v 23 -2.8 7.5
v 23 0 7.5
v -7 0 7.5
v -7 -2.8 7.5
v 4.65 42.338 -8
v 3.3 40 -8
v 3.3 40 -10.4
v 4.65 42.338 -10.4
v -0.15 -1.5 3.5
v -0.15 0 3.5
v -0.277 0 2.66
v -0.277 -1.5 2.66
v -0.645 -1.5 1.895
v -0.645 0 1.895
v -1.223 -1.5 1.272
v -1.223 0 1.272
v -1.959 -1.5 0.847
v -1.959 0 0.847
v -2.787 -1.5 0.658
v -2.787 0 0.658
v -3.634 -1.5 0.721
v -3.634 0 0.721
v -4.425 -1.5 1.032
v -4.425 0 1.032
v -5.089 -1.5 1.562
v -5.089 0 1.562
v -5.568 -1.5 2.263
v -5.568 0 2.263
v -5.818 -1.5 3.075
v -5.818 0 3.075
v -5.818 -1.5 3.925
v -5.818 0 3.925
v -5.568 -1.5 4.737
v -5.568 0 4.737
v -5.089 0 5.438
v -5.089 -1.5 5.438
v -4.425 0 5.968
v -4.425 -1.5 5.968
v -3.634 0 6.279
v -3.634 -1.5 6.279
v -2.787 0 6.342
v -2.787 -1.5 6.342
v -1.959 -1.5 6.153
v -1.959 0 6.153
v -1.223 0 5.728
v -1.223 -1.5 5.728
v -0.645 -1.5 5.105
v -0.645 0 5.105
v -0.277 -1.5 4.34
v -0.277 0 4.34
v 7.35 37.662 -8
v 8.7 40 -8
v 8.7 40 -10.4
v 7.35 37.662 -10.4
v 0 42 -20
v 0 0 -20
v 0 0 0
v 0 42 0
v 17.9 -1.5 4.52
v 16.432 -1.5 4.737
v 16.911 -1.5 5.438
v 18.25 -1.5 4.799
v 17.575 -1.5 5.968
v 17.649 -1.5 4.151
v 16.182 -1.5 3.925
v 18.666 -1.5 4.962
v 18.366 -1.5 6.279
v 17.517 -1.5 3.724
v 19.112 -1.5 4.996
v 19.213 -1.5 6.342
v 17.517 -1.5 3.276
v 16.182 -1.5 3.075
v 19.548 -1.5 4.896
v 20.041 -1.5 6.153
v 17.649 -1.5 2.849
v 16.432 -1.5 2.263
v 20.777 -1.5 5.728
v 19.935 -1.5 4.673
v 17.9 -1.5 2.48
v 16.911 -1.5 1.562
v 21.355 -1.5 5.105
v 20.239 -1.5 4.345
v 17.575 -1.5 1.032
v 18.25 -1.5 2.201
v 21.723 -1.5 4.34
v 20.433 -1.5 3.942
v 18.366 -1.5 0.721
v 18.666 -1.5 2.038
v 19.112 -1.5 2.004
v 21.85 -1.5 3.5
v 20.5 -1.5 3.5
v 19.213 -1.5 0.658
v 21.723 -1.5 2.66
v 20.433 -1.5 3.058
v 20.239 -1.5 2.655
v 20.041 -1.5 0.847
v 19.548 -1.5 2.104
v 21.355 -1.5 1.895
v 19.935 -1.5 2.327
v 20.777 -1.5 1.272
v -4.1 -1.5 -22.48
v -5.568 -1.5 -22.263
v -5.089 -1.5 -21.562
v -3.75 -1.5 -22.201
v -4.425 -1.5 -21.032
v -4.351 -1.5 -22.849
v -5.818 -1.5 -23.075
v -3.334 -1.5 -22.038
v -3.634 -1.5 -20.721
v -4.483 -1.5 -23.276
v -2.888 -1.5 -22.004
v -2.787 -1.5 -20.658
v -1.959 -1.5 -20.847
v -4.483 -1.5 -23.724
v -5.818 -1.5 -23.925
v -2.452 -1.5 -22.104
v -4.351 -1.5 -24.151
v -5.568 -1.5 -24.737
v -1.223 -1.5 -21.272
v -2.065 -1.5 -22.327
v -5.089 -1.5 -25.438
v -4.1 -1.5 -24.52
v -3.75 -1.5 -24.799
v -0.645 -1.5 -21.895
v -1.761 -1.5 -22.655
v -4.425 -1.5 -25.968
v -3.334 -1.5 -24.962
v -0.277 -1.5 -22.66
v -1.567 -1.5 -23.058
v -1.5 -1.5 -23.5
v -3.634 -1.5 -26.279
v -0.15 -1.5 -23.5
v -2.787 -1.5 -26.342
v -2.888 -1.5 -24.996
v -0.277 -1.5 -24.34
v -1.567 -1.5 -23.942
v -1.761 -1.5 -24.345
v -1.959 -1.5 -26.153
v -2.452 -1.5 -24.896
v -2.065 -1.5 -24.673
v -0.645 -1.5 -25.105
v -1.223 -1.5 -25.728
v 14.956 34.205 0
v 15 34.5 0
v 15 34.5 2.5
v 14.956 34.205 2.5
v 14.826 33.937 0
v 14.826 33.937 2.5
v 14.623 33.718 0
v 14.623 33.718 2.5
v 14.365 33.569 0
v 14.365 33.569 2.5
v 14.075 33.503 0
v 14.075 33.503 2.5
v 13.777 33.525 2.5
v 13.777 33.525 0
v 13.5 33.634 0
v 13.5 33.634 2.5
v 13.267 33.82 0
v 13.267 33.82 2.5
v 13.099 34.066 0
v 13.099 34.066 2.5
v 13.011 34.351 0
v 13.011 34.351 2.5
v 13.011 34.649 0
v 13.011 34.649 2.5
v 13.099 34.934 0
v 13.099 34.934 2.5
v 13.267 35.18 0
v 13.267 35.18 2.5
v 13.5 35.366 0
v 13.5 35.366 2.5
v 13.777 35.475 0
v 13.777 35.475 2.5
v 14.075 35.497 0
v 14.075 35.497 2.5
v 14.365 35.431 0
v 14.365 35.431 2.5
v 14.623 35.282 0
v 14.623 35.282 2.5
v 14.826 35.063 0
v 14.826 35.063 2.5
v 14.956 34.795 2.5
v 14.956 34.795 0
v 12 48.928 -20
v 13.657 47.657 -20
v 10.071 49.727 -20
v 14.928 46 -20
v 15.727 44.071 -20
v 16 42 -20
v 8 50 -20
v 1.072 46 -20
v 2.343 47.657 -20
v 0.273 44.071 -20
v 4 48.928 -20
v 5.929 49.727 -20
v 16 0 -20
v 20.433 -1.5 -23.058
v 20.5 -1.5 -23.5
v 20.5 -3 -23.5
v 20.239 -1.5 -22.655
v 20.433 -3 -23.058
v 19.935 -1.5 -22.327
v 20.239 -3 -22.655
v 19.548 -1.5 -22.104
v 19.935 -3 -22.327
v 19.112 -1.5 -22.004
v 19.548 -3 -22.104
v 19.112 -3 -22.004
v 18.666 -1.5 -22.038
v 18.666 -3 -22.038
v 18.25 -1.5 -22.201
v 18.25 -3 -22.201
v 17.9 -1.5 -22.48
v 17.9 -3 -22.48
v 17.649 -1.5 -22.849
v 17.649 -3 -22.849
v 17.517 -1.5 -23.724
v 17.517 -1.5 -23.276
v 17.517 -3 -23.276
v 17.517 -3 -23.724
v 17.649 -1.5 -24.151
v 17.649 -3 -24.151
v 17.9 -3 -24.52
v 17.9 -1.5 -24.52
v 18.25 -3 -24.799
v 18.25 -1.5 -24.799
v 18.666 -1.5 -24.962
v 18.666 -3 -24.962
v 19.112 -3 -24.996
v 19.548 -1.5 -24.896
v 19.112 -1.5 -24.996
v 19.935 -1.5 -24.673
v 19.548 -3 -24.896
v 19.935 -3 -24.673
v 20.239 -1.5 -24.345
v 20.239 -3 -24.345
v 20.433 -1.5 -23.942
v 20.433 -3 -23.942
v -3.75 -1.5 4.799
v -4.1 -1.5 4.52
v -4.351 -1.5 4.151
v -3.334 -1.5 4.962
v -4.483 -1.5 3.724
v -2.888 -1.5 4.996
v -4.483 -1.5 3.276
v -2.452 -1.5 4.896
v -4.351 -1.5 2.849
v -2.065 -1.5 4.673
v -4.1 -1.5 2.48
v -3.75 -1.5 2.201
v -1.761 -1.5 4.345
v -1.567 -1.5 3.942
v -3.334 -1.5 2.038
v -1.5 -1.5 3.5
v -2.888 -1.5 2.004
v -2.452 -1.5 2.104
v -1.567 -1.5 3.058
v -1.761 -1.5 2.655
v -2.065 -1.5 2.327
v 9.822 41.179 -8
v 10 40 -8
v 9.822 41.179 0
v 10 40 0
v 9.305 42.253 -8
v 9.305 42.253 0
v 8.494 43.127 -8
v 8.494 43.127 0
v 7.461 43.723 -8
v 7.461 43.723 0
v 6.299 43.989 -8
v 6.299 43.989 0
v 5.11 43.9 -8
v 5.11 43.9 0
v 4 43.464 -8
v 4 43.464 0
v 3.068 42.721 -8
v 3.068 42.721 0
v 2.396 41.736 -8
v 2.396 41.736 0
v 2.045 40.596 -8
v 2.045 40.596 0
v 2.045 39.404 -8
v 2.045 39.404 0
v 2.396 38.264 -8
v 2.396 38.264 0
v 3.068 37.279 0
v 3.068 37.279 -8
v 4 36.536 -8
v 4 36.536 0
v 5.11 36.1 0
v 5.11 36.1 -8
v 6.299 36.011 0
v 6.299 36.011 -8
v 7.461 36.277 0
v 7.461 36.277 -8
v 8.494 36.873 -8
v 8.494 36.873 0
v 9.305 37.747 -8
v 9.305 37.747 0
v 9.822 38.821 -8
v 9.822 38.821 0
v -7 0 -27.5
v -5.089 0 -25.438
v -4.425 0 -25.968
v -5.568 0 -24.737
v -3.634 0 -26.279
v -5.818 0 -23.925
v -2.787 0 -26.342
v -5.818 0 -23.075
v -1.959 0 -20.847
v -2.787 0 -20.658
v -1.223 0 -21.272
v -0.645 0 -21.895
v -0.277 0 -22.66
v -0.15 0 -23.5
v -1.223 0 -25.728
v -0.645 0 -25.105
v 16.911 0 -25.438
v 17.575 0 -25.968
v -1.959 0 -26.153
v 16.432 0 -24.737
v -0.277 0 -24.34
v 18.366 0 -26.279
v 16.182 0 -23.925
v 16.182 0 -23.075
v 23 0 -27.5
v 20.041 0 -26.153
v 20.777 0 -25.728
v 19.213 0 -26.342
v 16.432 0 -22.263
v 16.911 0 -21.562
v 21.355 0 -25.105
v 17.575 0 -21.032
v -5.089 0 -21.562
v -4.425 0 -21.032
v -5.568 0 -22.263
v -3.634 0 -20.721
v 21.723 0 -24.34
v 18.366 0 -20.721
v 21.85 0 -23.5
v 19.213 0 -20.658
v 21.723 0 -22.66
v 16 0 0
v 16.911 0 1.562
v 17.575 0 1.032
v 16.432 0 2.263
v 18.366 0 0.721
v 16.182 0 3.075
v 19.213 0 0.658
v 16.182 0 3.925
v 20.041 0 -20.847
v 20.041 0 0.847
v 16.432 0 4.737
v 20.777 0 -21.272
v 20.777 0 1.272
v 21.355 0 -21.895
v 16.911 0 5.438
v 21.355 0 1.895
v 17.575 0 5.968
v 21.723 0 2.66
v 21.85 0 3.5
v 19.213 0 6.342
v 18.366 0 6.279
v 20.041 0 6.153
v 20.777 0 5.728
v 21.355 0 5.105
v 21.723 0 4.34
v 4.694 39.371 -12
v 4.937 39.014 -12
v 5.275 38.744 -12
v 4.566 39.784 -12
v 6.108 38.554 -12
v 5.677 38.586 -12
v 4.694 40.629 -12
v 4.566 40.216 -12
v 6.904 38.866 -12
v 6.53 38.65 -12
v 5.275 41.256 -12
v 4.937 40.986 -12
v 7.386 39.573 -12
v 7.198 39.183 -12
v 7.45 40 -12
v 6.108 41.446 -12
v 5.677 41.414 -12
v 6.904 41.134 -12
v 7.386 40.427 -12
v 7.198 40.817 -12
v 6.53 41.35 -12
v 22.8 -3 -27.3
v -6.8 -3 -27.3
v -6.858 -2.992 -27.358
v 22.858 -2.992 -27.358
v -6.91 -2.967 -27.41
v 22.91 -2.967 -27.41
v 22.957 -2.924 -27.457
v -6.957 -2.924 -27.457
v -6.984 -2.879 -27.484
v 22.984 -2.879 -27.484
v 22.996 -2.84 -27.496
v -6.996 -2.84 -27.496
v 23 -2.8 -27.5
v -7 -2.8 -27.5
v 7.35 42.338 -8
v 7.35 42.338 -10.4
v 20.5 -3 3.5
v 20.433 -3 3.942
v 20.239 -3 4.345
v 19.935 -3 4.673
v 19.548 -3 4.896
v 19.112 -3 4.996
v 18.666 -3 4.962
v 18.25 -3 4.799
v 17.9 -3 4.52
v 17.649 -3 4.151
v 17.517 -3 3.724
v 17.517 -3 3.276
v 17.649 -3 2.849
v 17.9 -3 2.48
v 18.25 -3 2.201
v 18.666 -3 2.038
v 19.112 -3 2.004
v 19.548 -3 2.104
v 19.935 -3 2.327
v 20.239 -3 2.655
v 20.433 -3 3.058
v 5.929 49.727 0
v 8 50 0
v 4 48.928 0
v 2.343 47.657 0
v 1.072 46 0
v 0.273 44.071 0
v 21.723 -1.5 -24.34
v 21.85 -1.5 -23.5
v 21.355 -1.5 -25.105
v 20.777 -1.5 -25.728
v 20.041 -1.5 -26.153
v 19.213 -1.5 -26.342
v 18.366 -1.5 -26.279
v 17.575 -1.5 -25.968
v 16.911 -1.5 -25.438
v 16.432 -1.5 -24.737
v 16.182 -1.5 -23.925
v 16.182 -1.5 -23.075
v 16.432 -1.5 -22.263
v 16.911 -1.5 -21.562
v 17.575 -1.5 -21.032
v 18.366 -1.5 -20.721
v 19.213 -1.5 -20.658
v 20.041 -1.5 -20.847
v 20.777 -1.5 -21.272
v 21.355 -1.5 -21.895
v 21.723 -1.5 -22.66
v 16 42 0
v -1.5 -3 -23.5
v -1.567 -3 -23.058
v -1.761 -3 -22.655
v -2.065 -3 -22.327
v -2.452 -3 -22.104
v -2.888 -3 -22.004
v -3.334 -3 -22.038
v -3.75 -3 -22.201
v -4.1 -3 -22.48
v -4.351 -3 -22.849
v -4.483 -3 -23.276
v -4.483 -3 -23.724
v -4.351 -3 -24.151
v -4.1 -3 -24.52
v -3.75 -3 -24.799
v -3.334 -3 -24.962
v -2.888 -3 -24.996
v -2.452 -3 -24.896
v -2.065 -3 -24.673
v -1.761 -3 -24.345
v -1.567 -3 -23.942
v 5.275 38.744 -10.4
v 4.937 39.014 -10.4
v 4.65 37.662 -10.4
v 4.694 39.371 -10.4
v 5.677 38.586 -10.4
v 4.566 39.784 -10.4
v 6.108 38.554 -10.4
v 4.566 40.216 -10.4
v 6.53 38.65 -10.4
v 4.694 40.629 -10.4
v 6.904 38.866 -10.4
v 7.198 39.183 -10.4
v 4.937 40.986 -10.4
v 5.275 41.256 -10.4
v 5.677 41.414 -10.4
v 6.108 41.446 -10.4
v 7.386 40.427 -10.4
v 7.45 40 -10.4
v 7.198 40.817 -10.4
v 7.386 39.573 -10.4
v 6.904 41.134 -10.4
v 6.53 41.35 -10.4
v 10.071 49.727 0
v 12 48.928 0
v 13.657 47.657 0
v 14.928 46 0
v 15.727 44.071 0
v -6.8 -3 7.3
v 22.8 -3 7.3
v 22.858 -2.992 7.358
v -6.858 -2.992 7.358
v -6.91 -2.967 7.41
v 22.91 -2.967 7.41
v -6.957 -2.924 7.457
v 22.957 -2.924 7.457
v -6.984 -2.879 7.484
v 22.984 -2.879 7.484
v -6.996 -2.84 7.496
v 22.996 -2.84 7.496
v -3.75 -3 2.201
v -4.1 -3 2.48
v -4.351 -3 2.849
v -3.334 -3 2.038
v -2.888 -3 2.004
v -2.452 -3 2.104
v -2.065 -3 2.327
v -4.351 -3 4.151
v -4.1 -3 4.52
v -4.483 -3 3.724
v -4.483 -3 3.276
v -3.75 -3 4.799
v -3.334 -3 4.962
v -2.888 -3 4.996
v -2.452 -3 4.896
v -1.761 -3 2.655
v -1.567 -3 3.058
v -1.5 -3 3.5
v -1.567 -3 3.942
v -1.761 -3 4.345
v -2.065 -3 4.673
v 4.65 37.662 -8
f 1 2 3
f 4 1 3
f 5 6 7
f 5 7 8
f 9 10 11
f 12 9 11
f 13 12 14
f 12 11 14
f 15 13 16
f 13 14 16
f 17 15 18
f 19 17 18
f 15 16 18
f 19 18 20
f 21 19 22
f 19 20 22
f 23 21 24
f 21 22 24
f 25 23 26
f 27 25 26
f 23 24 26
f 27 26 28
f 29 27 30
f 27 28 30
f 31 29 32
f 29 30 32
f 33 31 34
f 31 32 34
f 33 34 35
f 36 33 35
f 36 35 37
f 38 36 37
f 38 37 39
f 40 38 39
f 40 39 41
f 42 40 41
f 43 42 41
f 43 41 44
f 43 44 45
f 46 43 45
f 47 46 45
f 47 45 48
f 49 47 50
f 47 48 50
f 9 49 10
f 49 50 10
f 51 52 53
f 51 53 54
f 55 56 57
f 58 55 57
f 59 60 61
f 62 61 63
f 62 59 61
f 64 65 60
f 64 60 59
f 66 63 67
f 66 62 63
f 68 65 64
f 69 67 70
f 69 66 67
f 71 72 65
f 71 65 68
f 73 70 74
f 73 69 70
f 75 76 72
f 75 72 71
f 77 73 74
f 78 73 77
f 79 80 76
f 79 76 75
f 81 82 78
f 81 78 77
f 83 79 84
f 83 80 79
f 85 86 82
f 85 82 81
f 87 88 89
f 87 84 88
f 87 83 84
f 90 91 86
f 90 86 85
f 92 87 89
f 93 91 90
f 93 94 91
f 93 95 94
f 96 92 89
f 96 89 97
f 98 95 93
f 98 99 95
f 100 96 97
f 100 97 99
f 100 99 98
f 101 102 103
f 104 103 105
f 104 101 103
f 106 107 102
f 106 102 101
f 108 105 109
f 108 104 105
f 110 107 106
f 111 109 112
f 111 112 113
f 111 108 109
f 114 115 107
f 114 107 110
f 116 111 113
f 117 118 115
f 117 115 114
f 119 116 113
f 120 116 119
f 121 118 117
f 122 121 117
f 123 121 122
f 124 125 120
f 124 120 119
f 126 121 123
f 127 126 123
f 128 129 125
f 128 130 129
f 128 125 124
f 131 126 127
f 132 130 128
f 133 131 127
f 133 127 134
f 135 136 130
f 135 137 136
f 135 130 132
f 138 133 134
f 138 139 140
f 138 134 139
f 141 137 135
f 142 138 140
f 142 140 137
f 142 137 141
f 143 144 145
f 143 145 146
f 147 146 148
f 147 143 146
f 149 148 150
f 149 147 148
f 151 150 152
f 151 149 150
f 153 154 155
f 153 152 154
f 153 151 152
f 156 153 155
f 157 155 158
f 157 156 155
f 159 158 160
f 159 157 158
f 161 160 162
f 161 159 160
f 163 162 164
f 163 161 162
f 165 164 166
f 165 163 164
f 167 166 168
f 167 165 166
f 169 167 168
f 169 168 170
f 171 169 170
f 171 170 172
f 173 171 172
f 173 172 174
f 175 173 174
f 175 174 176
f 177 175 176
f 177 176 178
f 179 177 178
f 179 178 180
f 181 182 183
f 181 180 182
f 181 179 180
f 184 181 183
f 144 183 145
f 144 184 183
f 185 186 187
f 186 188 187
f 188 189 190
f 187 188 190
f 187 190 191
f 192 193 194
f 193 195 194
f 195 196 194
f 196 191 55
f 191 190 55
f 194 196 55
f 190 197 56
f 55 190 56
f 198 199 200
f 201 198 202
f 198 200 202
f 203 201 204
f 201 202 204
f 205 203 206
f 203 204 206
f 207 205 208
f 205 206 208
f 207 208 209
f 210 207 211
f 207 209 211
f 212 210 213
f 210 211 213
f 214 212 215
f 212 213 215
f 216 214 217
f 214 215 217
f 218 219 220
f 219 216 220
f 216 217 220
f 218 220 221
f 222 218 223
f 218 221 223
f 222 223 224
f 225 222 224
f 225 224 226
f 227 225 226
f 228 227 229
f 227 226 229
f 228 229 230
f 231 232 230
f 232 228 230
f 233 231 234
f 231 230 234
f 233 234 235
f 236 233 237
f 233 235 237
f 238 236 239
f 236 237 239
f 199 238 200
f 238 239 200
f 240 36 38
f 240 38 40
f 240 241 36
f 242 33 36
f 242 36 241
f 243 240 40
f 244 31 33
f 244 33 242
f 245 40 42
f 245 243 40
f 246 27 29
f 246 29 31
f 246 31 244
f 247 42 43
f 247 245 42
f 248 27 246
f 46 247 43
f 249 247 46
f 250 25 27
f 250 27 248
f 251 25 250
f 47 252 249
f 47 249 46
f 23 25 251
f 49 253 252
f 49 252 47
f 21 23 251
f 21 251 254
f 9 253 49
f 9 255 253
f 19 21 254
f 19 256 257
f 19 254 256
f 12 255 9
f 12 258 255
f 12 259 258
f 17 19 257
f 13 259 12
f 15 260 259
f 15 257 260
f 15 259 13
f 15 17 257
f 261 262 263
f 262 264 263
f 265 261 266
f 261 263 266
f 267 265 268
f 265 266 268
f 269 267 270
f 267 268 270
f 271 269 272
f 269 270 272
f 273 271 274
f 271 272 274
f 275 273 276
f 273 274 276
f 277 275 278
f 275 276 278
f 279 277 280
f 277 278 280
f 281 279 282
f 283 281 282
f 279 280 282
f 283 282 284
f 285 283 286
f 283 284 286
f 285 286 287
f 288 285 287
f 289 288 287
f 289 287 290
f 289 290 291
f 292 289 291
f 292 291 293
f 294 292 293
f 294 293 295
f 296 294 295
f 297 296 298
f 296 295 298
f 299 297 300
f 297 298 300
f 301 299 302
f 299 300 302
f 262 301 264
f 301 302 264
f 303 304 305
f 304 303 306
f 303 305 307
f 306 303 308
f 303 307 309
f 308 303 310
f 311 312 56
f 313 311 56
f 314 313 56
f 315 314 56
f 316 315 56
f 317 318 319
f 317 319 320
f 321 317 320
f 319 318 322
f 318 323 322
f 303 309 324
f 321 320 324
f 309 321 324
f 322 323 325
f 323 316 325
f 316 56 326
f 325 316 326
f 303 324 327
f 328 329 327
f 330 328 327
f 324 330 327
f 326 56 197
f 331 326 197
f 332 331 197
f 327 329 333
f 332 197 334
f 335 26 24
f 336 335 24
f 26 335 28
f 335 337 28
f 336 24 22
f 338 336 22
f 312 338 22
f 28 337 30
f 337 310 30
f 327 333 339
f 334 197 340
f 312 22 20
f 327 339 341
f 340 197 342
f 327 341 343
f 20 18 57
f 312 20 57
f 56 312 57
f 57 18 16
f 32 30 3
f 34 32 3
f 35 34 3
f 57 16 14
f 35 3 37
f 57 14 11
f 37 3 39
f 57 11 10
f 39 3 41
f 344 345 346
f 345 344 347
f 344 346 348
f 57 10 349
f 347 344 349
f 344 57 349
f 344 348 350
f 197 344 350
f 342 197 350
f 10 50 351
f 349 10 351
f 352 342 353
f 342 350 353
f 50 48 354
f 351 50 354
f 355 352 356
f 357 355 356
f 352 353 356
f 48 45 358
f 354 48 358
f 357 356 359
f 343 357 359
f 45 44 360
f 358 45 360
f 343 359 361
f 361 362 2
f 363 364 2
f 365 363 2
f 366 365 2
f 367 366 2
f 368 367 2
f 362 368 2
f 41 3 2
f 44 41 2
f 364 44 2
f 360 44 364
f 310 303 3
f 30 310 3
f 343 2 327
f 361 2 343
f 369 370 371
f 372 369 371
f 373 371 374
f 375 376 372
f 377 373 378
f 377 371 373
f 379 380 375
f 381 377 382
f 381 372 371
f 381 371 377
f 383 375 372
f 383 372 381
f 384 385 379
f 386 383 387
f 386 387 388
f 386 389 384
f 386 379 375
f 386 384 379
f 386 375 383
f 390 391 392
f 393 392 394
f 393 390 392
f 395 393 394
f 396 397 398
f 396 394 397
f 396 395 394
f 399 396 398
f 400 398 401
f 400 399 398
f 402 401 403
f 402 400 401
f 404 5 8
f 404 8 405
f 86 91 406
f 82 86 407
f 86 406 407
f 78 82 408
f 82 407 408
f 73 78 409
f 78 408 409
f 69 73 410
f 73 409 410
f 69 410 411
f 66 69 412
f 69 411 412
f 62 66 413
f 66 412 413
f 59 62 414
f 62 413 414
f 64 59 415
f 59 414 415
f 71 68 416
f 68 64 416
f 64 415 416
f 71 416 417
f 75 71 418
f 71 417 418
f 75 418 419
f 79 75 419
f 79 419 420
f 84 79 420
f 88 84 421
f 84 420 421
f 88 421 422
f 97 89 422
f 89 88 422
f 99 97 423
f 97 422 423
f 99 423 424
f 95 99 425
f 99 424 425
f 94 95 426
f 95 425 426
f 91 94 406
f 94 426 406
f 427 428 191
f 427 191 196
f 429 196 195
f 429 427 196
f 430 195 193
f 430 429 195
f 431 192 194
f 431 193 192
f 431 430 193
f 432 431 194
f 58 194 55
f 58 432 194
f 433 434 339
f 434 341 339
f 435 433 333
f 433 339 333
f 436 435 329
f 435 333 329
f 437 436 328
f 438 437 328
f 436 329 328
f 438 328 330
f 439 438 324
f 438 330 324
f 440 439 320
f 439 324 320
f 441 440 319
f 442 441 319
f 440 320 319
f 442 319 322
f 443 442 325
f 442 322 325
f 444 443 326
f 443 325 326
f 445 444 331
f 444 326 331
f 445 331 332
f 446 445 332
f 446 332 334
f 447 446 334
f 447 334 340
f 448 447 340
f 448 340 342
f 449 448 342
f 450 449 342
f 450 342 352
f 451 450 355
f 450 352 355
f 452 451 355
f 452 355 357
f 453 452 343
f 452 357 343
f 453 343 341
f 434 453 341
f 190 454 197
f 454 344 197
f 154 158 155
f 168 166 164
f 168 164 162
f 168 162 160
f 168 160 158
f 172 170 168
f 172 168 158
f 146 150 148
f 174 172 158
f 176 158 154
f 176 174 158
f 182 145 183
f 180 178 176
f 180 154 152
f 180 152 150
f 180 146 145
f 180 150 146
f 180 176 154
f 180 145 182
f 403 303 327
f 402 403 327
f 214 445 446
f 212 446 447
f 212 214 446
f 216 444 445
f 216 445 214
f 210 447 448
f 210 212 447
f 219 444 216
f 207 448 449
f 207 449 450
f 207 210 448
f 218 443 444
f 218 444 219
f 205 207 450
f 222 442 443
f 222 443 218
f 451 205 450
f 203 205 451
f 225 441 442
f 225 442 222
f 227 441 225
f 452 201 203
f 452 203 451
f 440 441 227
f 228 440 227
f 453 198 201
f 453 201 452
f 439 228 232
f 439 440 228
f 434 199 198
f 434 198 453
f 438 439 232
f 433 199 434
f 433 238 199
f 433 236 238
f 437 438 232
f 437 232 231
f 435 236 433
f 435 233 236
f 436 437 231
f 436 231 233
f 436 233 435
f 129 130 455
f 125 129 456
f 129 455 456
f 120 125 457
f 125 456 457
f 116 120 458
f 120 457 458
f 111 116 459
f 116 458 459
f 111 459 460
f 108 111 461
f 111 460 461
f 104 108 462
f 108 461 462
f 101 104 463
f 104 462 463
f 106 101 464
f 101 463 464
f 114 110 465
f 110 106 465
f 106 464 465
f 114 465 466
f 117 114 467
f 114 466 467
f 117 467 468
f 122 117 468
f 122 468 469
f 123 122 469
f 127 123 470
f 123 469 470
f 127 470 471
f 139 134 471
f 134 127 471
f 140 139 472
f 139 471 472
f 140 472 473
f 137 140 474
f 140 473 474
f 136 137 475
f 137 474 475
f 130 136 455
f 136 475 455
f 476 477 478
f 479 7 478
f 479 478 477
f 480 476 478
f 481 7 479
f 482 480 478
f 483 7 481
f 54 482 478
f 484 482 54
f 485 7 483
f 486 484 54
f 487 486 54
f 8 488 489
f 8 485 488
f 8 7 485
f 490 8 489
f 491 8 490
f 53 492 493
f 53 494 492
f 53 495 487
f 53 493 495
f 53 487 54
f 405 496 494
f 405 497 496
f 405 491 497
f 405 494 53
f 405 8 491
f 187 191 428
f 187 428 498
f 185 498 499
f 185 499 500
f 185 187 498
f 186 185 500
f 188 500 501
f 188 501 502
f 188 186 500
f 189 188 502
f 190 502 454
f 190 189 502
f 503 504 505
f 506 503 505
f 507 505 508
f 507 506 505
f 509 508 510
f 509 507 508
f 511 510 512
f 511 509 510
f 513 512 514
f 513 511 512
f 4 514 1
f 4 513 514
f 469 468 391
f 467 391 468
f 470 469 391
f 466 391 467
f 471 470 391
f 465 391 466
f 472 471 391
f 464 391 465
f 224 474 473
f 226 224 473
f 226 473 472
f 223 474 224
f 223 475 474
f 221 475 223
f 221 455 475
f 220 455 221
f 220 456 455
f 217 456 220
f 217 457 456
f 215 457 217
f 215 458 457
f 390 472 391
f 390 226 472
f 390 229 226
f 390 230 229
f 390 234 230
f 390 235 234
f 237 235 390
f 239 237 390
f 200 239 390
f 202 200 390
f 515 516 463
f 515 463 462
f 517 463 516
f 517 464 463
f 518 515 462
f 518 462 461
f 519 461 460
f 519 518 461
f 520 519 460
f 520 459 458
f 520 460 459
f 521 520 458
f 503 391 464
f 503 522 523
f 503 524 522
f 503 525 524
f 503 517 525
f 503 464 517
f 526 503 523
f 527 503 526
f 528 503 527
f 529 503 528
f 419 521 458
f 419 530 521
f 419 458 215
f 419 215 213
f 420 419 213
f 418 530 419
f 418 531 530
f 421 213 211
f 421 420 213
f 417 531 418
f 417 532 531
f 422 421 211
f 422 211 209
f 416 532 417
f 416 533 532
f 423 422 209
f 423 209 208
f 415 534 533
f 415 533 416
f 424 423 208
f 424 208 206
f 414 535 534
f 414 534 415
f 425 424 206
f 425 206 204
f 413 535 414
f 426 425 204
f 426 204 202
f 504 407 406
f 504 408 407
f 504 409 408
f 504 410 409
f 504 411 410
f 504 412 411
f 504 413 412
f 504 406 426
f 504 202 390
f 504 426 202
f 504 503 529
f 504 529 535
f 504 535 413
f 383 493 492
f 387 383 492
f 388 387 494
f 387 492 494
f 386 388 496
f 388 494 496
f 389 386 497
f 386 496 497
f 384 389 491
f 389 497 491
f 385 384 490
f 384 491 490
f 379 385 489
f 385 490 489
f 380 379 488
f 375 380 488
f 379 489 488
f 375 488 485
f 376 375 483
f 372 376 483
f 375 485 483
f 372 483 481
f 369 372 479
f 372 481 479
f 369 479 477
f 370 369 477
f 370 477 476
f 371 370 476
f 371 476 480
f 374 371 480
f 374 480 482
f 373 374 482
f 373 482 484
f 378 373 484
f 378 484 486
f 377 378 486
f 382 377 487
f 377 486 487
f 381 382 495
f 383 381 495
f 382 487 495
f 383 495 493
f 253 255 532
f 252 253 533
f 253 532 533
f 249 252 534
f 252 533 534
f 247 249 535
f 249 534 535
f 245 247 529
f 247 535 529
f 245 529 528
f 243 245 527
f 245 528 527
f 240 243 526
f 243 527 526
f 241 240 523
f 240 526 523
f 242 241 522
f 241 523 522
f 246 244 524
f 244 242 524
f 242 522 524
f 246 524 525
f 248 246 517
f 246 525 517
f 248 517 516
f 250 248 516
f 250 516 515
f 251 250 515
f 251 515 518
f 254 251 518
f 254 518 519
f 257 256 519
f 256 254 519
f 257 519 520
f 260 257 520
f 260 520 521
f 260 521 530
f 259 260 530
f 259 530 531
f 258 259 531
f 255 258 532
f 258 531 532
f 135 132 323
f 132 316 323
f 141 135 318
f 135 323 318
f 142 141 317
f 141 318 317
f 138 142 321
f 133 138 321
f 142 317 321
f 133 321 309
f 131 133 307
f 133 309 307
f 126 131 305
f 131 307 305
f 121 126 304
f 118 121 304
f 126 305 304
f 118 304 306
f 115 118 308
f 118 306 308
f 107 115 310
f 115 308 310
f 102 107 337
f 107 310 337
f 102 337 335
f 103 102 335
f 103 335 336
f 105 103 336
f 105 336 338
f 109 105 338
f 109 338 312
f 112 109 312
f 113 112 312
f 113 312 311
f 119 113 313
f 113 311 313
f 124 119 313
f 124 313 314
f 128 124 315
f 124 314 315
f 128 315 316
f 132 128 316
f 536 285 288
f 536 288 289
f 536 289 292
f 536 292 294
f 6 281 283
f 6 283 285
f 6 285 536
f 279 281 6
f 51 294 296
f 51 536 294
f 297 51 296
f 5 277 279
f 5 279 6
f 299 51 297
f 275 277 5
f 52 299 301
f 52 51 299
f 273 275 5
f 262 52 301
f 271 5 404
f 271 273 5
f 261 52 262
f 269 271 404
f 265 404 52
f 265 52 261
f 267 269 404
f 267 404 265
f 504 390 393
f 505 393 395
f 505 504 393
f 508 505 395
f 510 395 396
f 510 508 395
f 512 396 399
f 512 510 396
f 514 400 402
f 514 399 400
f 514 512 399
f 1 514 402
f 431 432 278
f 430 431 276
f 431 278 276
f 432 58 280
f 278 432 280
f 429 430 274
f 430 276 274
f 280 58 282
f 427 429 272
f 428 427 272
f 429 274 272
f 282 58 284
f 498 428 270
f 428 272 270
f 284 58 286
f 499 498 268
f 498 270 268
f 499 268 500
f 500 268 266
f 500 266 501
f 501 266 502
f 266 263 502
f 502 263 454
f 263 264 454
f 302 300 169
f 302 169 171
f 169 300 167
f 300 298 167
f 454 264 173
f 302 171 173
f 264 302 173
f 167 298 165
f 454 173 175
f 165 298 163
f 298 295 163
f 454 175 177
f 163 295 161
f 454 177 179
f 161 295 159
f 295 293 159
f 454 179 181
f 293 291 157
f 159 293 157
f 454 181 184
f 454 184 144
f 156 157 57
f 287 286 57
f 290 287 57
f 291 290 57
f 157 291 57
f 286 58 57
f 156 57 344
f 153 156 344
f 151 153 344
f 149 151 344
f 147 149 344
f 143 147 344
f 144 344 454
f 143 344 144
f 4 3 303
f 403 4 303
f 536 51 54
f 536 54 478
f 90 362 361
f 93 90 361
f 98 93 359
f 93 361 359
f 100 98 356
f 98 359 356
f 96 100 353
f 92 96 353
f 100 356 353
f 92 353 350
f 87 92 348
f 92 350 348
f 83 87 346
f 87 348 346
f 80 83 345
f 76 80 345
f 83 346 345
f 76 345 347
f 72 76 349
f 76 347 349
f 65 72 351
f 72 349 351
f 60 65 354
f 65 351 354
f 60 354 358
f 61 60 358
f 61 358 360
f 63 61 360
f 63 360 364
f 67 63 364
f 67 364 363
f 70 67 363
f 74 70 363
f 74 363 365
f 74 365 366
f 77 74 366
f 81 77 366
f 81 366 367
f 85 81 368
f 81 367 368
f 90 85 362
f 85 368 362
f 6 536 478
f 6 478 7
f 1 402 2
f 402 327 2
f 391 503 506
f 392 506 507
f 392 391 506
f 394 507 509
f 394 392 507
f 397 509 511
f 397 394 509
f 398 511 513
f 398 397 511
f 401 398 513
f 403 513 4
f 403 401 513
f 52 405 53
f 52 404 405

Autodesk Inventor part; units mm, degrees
ref_plane "YZ Plane" through (0, 0, 0) normal (1, 0, 0) x (0, 1, 0)
ref_plane "XZ Plane" through (0, 0, 0) normal (0, 1, 0) x (-1, 0, 0)
ref_plane "XY Plane" through (0, 0, 0) normal (0, 0, 1) x (1, 0, 0)
sketch "底面" plane through (0, 0, 0) normal (0, 1, 0) x (-1, 0, 0)
  line L0 (0, 0) -> (-16, 0)
  line L1 (-16, 0) -> (-16, -20)
  line L2 (-16, -20) -> (0, -20)
  line L3 (0, -20) -> (0, 0)
  dimension "d0" = 16
  dimension "d1" = 20
extrude "本体" add sketch "底面" along normal blind 50
sketch "ねじ穴スケッチ" plane through (0, 0, 0) normal (0, 0, 1) x (1, 0, 0)
  circle A0 centre (6, 40) radius 1.45
  line L0 (0, 50) -> (16, 50) projected
  line L1 (16, 0) -> (16, 50) projected
  point P0 (0, 0)
  dimension "d6" = 10
  dimension "d9" = 2.9
  dimension "d17" = 10
extrude "ねじ穴" cut sketch "ねじ穴スケッチ" against normal blind 12
sketch "接合部スケッチ" plane through (0, 0, 0) normal (0, 0, 1) x (1, 0, 0)
  circle A0 centre (6, 40) radius 1.45 projected
  circle A1 centre (6, 40) radius 4
  point P0 (0, 0)
  dimension "d10" = 8
extrude "接合部" cut sketch "接合部スケッチ" against normal blind 8
sketch "スケッチ4" plane through (6, 40, -8) normal (0, 0, 1) x (1, 0, 0)
  line L0 (2.7, 0) -> (1.35, -2.3383)
  line L1 (1.35, -2.3383) -> (-1.35, -2.3383)
  line L2 (-1.35, -2.3383) -> (-2.7, 0)
  line L3 (-2.7, 0) -> (-1.35, 2.3383)
  line L4 (-1.35, 2.3383) -> (1.35, 2.3383)
  line L5 (1.35, 2.3383) -> (2.7, 0)
  circle A0 centre (0, 0) radius 1.45 projected
  point P0 (-6, -40)
  point P1 (0, 2.3383)
  dimension "d13" = 2.7
  dimension "d14" = 5.4
extrude "ナット穴" cut sketch "スケッチ4" against normal blind 2.4
fillet "フィレット1" radius 8 2 edges at (16, 50, -10) (0, 50, -10)
sketch "スケッチ5" plane through (0, 0, 0) normal (0, -1, 0) x (1, 0, 0)
  line L0 (23, 7.5) -> (-7, 7.5)
  line L1 (-7, 7.5) -> (-7, -27.5)
  line L2 (-7, -27.5) -> (23, -27.5)
  line L3 (23, -27.5) -> (23, 7.5)
  line L4 (0, 0) -> (16, 0) projected
  line L5 (16, 0) -> (16, -20) projected
  line L6 (0, -20) -> (0, 0) projected
  line L7 (16, -20) -> (0, -20) projected
  line L8 (0, 0) -> (16, 0) projected
  line L9 (16, 0) -> (16, -20) projected
  point P0 (8, 7.5)
  point P1 (8, 0)
  point P2 (23, -10)
  point P3 (16, -10)
  dimension "d42" = 30
  dimension "d43" = 35
extrude "足場" add sketch "スケッチ5" along normal blind 3 contours L3 L2 L1 L0 | L4 L5 L7 L6
sketch "スケッチ6" plane through (8, 42, 0) normal (0, 0, 1) x (1, 0, 0)
  circle A0 centre (6, -7.5) radius 1
  line L0 (15, -42) -> (-15, -42) projected
  line L1 (-8, -42) -> (-8, 0) projected
  line L2 (8, -42) -> (8, 0) projected
  dimension "d25" = 2
  dimension "d26" = 34.5
  dimension "d31" = 2
extrude "ストッパー" add sketch "スケッチ6" along normal blind 2.5
sketch "スケッチ7" plane through (0, -3, 0) normal (0, -1, 0) x (1, 0, 0)
  circle A0 centre (-3, 3.5) radius 1.5
  circle A1 centre (19, 3.5) radius 1.5
  circle A2 centre (19, -23.5) radius 1.5
  circle A3 centre (-3, -23.5) radius 1.5
  line L0 (-7, 7.5) -> (-7, -27.5) projected
  line L1 (23, 7.5) -> (-7, 7.5) projected
  line L2 (23, -27.5) -> (23, 7.5) projected
  line L3 (-7, -27.5) -> (23, -27.5) projected
  dimension "d32" = 3
  dimension "d33" = 3
  dimension "d34" = 3
  dimension "d35" = 3
  dimension "d36" = 4
  dimension "d37" = 4
  dimension "d38" = 4
  dimension "d39" = 4
extrude "押し出し7" cut sketch "スケッチ7" against normal through all contours A0 | A1 | A2 | A3
sketch "スケッチ8" plane through (0, 0, 0) normal (0, 1, 0) x (1, 0, 0)
  circle A0 centre (-3, 23.5) radius 1.5 projected
  circle A1 centre (-3, 23.5) radius 2.85
  circle A2 centre (19, 23.5) radius 2.85
  circle A3 centre (-3, -3.5) radius 2.85
  circle A4 centre (19, -3.5) radius 2.85
  circle A5 centre (19, 23.5) radius 1.5 projected
  circle A6 centre (19, -3.5) radius 1.5 projected
  circle A7 centre (-3, -3.5) radius 1.5 projected
  point P0 (0, 0)
  dimension "d44" = 5.7
  dimension "d45" = 5.7
  dimension "d46" = 5.7
  dimension "d47" = 5.7
extrude "ネジ溝" cut sketch "スケッチ8" against normal blind 1.5
fillet "フィレット2" radius 0.2 4 edges at (8, -3, 7.5) (23, -3, -10) (8, -3, -27.5) (-7, -3, -10)
equation "\"d17\" = d6"
equation "\"d37\" = d36"
equation "\"d38\" = d36"
equation "\"d39\" = d36"
equation "\"d45\" = d44"
equation "\"d46\" = d44"
equation "\"d47\" = d44"
properties part number "body-2_3D プリント"
